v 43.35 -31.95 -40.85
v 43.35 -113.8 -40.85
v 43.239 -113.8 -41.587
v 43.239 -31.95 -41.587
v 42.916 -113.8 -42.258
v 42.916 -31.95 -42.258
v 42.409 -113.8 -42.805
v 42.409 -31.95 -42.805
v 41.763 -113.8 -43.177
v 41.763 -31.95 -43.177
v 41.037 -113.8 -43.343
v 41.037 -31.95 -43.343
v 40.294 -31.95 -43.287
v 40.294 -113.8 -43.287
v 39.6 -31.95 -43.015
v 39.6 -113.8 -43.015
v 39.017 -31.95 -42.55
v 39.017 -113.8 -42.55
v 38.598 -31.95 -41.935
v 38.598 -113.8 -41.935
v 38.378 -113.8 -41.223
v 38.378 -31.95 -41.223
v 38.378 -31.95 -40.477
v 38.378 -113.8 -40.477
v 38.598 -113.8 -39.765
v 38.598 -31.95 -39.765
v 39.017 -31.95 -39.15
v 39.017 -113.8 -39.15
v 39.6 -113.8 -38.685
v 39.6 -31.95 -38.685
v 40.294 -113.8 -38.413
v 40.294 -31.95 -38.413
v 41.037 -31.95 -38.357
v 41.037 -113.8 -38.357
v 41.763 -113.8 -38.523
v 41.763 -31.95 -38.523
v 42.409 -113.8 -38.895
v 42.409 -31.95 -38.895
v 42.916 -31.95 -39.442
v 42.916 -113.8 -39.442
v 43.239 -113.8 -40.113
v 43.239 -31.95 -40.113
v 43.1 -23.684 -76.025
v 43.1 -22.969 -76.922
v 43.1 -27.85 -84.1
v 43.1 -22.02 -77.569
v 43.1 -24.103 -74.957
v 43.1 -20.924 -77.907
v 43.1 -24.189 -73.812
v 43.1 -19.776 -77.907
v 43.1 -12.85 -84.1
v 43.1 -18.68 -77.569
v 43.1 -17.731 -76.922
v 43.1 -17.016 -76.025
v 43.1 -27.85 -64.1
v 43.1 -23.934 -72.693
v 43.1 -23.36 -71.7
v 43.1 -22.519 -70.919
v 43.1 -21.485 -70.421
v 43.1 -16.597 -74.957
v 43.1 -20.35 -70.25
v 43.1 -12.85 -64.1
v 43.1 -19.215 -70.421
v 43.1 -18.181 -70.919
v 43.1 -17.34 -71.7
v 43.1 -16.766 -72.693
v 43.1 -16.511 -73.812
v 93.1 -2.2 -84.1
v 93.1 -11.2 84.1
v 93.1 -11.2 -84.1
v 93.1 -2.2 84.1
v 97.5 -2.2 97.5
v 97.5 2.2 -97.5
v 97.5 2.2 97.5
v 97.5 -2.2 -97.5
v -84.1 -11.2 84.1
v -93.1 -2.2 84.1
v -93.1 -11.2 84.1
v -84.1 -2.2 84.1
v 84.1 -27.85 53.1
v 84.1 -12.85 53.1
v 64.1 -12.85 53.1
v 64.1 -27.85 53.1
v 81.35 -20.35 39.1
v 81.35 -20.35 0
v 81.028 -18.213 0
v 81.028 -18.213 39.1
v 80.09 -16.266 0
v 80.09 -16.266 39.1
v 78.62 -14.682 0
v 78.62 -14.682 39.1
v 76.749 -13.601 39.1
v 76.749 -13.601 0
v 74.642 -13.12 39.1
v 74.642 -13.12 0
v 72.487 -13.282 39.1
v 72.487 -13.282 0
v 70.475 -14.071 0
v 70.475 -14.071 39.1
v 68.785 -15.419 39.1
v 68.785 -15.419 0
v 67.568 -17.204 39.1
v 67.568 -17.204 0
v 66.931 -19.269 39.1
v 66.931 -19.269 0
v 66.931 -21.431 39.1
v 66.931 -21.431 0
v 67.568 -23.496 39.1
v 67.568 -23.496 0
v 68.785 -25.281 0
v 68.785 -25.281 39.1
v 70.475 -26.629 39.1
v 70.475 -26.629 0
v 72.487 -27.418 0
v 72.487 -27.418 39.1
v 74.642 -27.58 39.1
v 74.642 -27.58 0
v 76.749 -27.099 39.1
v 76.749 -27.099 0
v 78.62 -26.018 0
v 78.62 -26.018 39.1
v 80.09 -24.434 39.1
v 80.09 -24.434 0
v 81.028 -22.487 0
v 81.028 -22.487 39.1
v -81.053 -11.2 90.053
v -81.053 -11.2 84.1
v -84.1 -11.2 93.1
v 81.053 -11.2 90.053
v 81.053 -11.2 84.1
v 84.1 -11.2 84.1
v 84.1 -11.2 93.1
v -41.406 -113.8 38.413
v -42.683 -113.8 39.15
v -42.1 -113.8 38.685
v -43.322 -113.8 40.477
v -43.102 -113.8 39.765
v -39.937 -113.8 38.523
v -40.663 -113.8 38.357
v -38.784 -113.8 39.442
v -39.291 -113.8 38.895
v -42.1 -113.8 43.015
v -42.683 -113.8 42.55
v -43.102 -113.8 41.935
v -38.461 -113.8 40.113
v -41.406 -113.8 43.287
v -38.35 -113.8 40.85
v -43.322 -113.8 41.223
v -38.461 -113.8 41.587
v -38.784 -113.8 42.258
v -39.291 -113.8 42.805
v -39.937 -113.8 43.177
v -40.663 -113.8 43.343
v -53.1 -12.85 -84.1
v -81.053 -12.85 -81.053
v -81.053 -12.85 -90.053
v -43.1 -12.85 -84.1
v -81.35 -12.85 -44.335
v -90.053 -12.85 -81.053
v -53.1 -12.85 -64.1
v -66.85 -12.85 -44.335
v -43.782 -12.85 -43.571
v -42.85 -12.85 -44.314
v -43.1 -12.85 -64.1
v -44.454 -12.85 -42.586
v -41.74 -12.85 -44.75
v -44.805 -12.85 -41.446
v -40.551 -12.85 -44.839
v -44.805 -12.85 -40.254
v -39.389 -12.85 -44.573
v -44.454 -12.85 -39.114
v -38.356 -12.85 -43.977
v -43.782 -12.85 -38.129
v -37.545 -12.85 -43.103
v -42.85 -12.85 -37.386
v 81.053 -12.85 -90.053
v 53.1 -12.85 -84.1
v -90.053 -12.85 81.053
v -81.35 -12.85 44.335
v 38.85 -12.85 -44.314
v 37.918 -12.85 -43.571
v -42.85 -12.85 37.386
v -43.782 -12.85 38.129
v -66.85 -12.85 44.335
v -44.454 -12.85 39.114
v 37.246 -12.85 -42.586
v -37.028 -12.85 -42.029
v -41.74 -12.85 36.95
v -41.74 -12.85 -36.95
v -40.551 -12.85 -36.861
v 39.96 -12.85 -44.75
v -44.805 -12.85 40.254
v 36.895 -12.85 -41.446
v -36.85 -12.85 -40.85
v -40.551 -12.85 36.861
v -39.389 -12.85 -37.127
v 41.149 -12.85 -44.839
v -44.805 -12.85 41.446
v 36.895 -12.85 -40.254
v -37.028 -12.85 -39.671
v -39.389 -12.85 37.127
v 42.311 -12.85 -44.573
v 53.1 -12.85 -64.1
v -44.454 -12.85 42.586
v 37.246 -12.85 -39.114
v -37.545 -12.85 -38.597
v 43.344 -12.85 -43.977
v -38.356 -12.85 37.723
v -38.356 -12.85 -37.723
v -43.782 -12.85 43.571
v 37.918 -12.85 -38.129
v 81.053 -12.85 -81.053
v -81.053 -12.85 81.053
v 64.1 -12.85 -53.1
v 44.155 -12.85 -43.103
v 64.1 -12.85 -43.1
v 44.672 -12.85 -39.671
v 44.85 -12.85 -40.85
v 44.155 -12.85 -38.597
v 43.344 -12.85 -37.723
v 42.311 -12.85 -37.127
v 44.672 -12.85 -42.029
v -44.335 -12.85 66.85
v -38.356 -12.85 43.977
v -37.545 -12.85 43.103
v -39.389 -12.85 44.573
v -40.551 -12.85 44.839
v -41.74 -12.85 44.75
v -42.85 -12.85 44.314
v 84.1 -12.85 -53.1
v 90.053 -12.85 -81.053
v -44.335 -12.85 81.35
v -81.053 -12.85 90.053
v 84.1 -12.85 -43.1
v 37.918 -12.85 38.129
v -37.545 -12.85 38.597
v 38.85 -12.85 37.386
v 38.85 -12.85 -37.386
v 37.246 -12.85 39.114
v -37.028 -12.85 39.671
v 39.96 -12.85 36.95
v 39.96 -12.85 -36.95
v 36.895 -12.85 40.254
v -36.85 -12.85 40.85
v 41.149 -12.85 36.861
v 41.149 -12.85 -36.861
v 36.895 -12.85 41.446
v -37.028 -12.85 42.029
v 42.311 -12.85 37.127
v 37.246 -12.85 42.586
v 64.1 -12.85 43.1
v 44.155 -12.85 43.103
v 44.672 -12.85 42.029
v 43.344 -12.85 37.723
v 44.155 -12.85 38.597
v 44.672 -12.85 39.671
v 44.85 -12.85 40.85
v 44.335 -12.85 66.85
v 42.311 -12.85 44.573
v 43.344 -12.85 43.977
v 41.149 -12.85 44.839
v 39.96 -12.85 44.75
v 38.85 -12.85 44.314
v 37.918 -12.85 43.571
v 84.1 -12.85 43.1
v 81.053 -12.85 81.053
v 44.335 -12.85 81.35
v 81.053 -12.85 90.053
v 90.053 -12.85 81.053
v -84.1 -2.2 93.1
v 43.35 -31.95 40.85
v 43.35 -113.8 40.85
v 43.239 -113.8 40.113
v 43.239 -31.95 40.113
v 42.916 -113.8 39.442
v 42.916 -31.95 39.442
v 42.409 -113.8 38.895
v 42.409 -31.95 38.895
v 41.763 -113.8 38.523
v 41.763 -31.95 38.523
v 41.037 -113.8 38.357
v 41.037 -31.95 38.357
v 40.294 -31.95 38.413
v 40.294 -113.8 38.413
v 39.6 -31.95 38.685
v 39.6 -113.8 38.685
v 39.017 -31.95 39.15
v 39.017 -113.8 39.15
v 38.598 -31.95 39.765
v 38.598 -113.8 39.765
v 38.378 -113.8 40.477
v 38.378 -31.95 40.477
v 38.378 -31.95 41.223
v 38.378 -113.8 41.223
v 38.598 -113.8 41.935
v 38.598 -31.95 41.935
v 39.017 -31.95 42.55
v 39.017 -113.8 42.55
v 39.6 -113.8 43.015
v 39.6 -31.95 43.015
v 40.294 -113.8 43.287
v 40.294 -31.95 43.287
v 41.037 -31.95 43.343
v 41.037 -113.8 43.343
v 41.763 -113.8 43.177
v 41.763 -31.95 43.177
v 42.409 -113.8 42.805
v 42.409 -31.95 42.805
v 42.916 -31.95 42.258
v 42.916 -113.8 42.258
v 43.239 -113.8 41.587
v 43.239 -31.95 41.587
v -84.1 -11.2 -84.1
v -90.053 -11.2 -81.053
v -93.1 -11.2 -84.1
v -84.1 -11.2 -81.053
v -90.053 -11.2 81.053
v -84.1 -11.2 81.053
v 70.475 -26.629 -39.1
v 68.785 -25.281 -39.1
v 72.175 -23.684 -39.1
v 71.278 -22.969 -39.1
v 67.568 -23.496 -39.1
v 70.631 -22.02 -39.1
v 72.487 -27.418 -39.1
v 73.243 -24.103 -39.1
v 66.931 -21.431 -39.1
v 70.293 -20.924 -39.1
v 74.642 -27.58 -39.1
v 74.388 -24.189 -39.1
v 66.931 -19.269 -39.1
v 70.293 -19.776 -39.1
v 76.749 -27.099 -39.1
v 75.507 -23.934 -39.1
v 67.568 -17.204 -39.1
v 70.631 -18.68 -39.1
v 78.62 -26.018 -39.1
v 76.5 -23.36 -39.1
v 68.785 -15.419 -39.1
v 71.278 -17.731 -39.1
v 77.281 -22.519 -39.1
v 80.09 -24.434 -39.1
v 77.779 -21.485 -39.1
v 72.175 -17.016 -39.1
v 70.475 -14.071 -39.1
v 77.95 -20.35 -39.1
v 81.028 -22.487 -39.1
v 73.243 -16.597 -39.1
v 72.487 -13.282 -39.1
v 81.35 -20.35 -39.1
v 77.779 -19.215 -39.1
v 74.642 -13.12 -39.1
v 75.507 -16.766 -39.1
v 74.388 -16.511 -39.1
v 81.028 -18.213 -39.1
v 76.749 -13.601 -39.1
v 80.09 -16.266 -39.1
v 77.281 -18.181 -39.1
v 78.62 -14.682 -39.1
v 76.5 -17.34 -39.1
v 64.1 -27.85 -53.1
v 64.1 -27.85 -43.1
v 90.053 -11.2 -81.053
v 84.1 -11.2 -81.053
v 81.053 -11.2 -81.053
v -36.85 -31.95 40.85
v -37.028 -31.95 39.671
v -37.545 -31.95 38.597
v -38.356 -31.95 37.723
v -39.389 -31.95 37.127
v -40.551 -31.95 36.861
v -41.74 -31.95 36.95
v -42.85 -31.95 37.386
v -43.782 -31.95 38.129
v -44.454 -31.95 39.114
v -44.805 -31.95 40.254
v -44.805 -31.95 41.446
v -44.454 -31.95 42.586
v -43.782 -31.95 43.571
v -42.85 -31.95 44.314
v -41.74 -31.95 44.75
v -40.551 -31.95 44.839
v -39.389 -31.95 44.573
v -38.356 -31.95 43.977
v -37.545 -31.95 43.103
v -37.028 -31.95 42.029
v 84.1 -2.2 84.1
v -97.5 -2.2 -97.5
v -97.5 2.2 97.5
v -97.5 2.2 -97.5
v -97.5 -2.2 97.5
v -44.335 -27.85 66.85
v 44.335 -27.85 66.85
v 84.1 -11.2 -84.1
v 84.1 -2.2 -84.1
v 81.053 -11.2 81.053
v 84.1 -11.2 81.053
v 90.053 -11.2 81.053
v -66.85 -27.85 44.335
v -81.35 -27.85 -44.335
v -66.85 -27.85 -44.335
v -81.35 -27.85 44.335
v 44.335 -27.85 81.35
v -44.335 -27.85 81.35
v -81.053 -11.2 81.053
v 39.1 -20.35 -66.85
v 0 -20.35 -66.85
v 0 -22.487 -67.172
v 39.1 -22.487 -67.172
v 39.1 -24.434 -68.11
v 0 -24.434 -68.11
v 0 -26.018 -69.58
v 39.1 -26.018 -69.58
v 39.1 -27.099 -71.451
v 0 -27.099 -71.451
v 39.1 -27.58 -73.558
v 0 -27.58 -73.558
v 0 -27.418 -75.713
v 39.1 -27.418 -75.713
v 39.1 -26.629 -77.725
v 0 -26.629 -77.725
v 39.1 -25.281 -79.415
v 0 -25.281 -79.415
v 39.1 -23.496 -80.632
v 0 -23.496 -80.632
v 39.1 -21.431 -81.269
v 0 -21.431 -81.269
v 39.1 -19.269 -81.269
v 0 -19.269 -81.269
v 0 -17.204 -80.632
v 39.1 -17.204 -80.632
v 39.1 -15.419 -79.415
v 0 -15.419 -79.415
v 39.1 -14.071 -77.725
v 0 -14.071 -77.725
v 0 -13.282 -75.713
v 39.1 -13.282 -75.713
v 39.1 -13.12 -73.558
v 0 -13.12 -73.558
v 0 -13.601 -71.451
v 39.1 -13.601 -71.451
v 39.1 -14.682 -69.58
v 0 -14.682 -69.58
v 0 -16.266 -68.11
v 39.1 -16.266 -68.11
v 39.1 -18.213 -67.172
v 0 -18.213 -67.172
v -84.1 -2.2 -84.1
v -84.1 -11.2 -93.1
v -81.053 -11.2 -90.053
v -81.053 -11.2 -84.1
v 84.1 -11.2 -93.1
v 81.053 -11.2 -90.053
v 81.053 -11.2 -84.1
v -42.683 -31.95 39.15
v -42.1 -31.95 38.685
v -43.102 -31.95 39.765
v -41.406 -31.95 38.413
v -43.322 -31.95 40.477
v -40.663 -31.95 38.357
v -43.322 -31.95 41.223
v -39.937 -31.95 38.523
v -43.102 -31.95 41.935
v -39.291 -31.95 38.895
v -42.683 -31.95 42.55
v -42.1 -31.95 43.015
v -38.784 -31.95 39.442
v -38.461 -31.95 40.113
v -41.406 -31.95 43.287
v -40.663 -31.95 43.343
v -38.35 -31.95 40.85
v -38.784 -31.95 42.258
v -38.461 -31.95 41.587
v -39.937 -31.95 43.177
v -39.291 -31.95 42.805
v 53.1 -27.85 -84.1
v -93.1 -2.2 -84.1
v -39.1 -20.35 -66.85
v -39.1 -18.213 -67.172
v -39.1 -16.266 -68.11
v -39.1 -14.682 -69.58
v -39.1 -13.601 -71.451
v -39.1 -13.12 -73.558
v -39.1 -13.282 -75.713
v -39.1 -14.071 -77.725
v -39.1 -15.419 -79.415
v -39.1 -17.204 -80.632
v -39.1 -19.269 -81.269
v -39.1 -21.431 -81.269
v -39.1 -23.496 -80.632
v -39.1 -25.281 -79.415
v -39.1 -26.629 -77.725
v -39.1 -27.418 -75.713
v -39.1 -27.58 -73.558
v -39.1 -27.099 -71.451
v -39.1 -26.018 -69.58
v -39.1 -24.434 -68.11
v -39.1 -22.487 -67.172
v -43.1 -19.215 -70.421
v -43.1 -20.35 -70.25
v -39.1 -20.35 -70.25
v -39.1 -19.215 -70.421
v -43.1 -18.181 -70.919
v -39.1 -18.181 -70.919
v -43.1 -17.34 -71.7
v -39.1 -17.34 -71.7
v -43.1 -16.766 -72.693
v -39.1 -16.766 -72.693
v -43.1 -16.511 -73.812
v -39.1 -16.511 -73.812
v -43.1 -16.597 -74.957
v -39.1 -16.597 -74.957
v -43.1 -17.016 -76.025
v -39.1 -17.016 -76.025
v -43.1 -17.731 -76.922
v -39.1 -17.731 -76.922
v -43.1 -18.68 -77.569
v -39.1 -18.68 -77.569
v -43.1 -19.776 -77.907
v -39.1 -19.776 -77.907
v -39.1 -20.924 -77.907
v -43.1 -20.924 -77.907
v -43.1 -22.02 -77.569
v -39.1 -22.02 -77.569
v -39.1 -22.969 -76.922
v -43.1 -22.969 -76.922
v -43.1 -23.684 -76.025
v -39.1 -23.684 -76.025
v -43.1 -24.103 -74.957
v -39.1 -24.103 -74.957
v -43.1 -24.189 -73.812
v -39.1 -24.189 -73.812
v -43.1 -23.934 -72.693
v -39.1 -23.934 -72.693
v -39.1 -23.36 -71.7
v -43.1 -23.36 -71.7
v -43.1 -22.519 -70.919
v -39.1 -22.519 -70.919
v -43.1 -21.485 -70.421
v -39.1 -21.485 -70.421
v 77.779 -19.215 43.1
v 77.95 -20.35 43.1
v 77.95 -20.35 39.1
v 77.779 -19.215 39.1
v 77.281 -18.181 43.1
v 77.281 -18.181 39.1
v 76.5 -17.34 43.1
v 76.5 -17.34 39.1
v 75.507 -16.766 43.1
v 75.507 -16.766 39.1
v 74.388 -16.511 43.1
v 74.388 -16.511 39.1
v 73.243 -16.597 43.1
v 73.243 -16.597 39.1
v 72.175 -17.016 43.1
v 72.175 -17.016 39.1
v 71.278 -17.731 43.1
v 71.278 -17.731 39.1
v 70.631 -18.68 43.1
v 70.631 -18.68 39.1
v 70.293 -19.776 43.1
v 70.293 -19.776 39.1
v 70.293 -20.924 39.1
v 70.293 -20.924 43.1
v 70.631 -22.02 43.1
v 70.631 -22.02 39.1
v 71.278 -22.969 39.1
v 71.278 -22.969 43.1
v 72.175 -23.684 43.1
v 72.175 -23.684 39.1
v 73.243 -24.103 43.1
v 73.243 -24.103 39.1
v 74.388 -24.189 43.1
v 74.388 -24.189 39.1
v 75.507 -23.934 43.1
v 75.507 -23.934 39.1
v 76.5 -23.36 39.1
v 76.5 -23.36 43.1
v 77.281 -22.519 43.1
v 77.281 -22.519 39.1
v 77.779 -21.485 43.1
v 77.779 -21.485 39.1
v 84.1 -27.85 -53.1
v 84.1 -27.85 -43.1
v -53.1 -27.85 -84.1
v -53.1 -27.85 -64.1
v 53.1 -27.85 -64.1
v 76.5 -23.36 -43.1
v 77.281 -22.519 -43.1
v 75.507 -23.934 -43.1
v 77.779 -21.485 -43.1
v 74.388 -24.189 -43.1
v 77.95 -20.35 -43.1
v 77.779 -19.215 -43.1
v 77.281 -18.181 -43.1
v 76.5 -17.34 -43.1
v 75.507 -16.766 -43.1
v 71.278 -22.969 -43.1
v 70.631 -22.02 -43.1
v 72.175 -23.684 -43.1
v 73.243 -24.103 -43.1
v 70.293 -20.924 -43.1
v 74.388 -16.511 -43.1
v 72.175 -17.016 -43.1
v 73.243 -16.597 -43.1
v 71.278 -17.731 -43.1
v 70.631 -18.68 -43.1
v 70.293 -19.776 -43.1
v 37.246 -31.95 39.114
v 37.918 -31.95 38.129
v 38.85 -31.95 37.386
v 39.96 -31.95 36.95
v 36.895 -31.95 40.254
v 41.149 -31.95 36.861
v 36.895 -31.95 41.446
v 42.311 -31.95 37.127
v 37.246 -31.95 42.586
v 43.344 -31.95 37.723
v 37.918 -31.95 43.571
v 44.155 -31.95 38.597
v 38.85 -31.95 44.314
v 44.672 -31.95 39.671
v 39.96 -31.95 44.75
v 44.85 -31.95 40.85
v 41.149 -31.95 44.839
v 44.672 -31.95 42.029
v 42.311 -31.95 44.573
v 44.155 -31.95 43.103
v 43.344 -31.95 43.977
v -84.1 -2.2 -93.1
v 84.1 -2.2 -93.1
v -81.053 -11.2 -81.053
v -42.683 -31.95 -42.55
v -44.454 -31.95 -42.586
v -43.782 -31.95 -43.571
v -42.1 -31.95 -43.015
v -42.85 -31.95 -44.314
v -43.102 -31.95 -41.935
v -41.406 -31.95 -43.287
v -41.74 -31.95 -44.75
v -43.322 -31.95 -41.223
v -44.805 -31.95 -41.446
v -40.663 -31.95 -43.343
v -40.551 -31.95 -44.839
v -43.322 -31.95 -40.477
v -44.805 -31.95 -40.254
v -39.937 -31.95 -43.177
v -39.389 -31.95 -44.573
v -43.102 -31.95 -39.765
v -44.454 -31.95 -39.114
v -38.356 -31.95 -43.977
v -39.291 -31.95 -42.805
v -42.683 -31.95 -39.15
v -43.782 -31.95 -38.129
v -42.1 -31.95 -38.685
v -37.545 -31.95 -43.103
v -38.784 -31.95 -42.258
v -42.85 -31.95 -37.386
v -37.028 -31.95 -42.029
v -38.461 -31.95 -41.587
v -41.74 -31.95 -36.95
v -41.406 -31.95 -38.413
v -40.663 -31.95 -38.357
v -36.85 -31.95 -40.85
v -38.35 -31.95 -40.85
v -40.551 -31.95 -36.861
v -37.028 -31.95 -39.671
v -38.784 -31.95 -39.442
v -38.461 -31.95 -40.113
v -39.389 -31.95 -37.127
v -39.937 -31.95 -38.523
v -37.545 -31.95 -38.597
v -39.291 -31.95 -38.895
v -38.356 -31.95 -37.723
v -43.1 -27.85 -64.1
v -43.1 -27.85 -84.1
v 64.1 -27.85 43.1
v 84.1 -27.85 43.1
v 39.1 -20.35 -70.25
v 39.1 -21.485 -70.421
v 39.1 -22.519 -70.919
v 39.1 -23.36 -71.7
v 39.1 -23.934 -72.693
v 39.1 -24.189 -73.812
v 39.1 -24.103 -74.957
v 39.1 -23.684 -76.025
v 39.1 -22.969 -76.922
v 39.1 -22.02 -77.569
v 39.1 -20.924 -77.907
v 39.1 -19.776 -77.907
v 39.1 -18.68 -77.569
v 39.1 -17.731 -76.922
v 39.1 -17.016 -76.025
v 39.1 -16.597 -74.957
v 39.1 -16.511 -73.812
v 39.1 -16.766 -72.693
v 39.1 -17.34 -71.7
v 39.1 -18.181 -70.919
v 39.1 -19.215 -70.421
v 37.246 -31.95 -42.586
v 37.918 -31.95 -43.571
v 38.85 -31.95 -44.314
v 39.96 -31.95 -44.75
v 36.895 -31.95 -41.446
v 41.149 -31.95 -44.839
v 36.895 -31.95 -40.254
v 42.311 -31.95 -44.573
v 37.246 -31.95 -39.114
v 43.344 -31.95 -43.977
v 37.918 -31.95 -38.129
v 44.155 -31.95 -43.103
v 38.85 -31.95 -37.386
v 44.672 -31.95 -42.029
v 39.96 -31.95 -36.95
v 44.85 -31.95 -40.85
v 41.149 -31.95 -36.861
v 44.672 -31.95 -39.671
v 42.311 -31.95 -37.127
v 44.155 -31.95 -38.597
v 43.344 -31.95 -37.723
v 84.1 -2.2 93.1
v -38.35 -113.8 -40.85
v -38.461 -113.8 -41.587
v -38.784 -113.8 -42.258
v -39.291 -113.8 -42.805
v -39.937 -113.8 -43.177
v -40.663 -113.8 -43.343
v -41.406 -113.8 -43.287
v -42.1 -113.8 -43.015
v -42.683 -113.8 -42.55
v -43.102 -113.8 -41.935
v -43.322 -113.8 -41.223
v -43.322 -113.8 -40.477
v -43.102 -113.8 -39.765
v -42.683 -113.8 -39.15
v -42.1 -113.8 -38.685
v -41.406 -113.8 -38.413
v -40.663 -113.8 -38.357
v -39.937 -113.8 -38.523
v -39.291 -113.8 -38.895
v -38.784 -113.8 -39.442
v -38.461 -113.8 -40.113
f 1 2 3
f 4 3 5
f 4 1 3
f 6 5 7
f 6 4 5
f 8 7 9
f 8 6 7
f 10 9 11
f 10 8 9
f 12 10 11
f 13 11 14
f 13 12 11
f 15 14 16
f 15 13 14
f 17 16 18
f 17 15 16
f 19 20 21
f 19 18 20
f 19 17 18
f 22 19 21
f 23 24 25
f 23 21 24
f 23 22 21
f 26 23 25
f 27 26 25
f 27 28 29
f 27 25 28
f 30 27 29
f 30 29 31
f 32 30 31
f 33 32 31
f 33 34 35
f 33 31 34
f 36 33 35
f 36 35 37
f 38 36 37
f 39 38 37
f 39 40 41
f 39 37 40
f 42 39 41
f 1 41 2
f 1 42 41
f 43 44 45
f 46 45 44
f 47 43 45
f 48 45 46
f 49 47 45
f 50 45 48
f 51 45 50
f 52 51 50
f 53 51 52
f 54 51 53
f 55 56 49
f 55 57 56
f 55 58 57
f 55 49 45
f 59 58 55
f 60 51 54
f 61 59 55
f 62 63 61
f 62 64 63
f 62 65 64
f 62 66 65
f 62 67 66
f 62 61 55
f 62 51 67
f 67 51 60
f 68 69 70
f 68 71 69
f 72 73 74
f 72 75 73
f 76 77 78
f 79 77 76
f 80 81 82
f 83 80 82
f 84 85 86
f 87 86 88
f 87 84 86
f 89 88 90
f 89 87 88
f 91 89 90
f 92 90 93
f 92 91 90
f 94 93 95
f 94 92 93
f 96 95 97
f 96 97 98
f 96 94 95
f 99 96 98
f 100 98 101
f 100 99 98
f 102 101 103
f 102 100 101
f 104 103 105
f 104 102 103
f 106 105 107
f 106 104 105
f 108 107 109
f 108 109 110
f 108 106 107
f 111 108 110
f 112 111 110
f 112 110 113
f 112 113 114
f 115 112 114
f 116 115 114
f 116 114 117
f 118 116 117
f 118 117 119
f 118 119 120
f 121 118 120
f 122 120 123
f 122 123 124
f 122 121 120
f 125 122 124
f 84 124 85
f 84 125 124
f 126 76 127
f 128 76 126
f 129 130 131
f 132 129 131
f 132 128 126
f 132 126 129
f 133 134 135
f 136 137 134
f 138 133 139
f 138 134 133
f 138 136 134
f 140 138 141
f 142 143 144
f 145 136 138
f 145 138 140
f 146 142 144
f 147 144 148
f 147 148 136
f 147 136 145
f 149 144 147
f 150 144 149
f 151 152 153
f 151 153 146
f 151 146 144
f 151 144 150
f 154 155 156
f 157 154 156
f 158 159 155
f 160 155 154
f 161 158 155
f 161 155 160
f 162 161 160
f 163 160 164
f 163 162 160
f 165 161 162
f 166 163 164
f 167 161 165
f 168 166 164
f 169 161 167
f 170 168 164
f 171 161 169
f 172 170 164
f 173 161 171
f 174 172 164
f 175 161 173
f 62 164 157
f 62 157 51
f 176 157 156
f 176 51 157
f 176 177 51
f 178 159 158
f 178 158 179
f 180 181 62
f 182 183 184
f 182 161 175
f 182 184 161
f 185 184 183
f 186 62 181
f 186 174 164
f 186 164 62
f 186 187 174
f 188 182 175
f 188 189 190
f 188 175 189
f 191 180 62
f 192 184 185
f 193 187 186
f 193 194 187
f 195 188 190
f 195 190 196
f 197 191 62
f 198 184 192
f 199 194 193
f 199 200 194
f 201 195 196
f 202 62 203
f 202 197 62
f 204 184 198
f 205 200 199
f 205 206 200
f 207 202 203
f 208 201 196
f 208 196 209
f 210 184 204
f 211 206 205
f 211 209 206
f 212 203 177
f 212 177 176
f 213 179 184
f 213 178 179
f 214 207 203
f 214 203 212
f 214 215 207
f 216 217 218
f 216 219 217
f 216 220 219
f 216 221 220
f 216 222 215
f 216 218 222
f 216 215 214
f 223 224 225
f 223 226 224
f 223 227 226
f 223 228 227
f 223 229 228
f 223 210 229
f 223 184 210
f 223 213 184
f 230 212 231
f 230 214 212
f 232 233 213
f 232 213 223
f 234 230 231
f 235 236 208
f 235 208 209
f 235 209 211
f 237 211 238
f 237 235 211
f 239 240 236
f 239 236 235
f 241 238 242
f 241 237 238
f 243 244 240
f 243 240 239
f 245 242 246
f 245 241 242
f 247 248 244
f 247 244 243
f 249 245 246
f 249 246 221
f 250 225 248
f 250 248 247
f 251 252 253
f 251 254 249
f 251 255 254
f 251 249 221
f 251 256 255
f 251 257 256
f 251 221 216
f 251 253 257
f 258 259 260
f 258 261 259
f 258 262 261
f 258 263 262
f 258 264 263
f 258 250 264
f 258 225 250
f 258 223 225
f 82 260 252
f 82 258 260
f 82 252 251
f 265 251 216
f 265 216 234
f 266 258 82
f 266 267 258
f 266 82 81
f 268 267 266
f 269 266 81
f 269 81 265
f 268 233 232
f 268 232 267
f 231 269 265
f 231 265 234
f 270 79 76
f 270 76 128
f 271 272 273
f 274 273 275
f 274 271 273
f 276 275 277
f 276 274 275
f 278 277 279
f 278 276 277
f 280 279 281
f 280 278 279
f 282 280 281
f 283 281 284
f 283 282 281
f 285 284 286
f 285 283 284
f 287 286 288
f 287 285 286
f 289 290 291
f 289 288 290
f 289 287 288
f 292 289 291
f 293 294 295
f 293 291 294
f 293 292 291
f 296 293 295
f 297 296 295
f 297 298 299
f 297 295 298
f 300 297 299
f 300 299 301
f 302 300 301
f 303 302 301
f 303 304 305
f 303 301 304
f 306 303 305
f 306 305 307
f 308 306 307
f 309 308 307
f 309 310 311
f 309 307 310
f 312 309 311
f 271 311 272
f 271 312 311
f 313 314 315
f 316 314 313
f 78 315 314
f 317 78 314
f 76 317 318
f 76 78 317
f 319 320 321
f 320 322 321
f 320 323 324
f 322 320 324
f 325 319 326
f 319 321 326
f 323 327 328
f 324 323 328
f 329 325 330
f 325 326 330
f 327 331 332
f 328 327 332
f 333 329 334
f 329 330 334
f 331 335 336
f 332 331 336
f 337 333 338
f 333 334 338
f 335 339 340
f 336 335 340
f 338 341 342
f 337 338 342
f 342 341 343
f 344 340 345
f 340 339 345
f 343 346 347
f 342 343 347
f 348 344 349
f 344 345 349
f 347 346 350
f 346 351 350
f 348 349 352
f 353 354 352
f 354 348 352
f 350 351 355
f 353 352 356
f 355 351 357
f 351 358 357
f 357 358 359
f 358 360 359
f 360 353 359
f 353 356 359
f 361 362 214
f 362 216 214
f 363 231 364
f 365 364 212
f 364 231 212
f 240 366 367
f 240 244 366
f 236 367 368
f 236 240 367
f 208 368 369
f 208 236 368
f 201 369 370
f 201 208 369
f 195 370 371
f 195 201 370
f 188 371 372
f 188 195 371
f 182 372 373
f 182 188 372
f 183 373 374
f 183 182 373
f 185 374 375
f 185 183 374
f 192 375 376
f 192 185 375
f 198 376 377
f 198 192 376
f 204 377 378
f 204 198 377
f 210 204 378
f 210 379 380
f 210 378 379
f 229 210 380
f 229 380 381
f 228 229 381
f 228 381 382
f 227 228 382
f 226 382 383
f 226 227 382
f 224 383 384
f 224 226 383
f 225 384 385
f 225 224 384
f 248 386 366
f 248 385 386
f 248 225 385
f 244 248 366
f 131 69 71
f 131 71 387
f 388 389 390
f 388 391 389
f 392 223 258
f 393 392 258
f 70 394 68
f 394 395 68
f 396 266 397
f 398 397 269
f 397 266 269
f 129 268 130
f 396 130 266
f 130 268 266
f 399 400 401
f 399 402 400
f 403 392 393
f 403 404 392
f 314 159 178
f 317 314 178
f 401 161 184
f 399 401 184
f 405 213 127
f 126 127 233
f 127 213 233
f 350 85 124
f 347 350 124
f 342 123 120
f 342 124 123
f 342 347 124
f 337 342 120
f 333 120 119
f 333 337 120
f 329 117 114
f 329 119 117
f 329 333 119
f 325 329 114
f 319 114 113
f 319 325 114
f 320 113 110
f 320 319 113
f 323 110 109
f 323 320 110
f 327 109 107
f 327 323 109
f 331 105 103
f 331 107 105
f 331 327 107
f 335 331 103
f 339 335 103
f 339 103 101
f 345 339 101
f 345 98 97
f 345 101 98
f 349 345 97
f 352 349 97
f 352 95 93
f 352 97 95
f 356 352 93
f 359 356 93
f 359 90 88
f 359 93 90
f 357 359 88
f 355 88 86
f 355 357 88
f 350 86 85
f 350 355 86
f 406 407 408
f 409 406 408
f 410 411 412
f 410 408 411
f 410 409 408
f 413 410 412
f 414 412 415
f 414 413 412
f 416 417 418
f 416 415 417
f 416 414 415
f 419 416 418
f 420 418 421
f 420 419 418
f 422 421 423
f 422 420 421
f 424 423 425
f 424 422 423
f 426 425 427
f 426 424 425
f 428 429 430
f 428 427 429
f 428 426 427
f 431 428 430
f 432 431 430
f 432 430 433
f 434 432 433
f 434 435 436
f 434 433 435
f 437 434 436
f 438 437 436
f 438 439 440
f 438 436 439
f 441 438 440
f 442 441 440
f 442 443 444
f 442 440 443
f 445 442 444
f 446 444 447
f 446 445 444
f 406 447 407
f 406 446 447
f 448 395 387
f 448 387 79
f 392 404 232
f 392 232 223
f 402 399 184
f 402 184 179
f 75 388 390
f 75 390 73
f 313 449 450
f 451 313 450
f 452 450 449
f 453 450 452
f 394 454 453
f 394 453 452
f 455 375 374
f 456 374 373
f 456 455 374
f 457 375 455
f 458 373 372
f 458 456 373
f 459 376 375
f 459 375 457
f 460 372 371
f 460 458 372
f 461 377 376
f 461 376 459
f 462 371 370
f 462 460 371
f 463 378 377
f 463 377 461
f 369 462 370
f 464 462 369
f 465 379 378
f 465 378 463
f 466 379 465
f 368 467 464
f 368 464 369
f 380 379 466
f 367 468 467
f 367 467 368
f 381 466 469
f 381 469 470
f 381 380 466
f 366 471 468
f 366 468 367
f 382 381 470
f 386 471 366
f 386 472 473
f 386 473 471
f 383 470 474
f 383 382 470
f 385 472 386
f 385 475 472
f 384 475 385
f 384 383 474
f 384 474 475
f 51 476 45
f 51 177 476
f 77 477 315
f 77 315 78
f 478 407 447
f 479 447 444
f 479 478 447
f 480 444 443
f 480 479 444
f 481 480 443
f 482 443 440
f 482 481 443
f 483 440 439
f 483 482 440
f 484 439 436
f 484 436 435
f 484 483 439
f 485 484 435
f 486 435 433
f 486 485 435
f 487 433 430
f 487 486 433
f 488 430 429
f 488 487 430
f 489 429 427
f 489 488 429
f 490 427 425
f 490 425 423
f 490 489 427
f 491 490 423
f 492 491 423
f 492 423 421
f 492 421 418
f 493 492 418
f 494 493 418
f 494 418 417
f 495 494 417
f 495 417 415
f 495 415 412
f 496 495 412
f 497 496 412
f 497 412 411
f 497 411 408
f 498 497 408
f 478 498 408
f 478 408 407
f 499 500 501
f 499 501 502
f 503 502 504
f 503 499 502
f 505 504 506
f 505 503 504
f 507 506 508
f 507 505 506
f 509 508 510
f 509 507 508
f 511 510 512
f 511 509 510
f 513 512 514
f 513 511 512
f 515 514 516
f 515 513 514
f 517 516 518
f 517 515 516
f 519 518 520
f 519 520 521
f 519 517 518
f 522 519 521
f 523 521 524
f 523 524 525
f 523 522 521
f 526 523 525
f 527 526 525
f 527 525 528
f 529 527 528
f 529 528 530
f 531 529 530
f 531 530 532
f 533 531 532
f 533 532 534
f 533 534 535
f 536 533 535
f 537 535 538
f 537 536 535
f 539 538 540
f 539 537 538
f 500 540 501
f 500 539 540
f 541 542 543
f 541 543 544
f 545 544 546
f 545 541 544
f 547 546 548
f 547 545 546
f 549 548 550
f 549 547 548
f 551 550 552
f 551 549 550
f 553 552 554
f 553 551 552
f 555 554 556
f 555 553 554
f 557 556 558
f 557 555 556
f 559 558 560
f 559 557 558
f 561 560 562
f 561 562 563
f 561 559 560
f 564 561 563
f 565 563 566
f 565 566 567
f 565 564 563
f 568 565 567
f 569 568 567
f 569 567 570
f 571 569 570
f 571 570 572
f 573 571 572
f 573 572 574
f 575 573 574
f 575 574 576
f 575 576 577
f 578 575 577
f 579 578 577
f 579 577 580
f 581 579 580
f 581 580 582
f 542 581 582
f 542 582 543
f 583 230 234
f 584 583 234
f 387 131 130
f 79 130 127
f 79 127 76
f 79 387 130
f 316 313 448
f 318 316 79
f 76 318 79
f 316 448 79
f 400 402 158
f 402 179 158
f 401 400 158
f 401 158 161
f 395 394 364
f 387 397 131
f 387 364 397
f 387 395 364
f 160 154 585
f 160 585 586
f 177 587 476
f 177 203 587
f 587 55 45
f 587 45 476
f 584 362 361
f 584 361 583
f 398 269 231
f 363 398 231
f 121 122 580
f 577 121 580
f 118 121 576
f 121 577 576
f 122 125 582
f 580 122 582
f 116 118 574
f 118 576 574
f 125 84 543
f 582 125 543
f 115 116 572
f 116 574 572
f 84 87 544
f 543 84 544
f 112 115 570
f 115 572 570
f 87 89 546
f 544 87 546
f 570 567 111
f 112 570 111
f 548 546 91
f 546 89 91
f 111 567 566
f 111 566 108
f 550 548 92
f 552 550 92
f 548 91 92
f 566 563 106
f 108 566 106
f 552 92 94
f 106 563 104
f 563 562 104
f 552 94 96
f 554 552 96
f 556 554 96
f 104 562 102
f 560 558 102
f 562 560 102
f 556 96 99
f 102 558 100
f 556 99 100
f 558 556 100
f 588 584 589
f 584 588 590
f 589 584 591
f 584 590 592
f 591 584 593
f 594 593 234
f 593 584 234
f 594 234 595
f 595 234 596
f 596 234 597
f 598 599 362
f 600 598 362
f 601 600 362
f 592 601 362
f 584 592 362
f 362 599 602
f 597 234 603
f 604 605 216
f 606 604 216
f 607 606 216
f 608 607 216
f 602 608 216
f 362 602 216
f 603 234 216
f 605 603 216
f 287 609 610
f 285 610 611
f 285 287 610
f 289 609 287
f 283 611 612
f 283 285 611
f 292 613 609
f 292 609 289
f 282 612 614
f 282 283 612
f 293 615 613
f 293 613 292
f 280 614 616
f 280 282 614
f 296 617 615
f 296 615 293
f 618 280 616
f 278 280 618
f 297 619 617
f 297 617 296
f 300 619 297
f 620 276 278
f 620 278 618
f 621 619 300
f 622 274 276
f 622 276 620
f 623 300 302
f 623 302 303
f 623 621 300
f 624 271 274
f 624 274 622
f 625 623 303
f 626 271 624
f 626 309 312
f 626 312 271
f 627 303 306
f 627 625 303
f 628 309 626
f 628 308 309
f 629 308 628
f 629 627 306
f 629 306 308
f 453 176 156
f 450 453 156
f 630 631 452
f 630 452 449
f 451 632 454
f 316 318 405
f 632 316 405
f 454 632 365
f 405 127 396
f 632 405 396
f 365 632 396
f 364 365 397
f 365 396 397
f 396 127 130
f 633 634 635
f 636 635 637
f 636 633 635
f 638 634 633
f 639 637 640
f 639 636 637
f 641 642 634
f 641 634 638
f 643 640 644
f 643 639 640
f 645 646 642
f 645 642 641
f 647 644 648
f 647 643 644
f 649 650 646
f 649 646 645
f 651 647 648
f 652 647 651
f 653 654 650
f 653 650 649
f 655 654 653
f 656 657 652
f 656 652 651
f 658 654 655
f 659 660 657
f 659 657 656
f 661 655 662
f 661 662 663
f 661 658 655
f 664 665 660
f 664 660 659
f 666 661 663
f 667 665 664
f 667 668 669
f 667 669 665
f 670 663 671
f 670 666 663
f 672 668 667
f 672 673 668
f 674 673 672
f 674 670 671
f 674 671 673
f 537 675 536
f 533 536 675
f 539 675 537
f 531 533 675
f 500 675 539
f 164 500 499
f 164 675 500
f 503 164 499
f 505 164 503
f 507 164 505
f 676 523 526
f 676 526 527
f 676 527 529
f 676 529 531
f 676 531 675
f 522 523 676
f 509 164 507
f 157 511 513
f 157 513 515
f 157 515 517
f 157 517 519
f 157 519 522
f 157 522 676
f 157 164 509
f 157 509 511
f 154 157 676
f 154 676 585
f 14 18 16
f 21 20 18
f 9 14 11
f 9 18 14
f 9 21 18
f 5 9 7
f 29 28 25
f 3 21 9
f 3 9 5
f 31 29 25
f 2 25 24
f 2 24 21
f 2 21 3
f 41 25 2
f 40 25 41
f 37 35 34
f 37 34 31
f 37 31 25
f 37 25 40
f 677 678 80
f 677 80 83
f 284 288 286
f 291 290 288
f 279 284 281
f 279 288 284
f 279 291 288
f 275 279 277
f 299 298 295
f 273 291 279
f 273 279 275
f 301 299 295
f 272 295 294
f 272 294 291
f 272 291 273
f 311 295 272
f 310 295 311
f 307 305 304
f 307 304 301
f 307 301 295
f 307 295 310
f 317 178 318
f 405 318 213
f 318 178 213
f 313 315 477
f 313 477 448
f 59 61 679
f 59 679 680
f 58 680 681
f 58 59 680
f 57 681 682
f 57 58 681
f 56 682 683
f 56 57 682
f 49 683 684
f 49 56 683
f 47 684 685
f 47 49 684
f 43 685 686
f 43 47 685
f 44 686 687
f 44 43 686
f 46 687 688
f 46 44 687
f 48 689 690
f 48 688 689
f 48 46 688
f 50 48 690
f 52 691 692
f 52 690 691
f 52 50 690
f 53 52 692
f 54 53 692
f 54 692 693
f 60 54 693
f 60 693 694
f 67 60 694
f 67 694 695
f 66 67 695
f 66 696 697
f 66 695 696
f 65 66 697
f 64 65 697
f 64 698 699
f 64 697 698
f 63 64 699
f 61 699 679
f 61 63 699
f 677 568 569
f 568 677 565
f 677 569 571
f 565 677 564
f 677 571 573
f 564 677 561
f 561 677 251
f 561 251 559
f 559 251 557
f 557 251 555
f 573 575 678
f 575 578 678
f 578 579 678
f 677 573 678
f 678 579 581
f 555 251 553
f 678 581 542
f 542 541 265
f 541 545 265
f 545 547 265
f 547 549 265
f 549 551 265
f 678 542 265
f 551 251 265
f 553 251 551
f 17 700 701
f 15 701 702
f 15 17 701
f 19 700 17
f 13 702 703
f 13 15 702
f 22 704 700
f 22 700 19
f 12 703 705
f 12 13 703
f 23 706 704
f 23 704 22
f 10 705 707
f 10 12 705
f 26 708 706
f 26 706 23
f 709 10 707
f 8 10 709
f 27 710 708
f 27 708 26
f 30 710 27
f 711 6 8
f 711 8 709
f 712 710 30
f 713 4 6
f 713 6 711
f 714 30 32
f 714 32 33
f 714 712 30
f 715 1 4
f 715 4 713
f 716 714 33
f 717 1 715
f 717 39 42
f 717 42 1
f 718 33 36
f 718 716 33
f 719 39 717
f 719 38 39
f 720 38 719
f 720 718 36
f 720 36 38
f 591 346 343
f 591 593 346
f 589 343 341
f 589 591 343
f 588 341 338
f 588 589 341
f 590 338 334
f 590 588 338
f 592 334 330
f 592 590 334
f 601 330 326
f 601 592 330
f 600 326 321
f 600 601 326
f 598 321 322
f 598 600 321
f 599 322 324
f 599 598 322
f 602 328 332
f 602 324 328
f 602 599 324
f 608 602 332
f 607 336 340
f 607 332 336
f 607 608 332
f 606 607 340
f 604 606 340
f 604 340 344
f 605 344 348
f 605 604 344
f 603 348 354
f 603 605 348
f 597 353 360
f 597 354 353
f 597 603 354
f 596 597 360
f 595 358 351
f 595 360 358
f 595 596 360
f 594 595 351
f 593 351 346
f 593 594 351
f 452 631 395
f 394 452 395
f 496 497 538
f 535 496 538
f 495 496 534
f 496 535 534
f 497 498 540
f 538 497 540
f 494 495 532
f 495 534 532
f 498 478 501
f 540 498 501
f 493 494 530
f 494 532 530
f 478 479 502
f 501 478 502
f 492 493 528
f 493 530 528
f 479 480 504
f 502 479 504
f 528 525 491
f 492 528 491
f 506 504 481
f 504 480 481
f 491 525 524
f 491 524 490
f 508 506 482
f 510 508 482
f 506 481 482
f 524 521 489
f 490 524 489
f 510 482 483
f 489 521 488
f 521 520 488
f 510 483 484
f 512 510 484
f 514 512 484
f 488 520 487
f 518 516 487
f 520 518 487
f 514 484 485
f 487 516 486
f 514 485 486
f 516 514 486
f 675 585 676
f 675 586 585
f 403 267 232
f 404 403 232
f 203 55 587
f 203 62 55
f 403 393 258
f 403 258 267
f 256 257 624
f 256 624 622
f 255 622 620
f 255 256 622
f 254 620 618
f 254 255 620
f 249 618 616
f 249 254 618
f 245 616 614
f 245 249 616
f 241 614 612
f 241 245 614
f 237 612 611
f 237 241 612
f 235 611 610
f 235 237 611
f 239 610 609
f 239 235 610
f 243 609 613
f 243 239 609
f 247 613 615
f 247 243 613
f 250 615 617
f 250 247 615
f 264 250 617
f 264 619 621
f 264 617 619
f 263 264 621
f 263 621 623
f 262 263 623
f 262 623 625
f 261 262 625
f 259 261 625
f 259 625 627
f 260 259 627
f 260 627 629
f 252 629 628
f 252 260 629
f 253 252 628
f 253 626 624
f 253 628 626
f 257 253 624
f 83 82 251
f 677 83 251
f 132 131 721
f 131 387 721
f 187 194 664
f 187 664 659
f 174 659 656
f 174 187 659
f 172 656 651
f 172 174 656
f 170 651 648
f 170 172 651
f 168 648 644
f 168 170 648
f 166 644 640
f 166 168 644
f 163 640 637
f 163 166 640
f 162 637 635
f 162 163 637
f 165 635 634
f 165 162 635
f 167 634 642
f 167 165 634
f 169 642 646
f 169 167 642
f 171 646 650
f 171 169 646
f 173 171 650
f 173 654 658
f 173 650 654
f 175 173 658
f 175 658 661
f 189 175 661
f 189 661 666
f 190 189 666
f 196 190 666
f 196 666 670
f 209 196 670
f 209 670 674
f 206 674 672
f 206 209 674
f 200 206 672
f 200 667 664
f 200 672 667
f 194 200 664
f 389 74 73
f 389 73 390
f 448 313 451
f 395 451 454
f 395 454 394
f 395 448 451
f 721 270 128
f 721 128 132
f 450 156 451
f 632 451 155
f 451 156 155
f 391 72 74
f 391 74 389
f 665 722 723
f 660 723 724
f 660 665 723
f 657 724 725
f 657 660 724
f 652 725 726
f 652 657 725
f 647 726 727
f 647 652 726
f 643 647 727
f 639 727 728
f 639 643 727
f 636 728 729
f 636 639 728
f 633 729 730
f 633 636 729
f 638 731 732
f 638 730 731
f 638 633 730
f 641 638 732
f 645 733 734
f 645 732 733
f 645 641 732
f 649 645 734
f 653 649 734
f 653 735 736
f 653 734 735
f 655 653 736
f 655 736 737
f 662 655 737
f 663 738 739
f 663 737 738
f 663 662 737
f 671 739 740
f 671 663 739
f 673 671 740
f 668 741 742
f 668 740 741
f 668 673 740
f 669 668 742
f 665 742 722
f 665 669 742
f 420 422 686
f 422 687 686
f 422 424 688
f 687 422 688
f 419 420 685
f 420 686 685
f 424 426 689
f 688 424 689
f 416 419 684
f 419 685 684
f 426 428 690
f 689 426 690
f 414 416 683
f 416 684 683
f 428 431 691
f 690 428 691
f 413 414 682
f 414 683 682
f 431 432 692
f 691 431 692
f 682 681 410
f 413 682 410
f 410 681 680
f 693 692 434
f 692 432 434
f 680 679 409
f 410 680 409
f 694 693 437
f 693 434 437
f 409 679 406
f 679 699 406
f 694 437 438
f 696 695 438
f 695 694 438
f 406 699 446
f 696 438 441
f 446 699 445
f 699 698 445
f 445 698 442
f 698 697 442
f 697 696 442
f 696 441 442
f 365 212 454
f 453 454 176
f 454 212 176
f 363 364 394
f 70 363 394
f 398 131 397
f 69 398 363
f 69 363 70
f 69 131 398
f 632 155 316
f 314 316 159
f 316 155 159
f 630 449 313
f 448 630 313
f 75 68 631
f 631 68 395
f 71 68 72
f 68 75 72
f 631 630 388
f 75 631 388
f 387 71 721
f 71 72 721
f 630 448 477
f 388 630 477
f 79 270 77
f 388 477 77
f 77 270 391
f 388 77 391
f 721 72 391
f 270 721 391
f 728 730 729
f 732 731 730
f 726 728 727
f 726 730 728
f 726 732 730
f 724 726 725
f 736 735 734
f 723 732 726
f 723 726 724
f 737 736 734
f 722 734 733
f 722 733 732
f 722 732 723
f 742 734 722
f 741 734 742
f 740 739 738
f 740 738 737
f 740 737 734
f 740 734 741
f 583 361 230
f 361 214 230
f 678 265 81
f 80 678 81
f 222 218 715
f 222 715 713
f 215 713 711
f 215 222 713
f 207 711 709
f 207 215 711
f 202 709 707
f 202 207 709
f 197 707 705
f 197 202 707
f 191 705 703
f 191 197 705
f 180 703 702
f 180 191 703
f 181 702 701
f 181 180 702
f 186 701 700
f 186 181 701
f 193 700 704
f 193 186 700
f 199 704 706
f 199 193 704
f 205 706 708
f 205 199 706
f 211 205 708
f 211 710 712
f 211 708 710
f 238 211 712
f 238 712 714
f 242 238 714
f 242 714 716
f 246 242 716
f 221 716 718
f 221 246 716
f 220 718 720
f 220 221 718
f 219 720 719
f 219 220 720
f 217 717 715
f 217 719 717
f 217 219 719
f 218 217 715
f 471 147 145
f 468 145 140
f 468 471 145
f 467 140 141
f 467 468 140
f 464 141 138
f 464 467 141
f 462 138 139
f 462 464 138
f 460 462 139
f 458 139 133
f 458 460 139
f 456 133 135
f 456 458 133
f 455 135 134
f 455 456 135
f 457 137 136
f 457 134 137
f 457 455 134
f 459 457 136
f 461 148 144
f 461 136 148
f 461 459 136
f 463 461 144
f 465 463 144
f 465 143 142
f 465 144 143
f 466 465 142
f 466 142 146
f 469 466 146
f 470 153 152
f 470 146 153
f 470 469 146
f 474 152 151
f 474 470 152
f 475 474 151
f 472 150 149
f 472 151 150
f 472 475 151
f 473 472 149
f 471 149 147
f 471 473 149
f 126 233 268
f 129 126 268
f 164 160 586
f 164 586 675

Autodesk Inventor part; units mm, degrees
ref_plane "YZ Plane" through (0, 0, 0) normal (1, 0, 0) x (0, 1, 0)
ref_plane "XZ Plane" through (0, 0, 0) normal (0, 1, 0) x (-1, 0, 0)
ref_plane "XY Plane" through (0, 0, 0) normal (0, 0, 1) x (1, 0, 0)
sketch "Boceto1" plane through (0, 0, 0) normal (0, 1, 0) x (-1, 0, 0)
  line L0 (-97.5, 97.5) -> (97.5, 97.5)
  line L1 (97.5, 97.5) -> (97.5, -97.5)
  line L2 (97.5, -97.5) -> (-97.5, -97.5)
  line L3 (-97.5, -97.5) -> (-97.5, 97.5)
  line L4 (-97.5, 97.5) -> (97.5, -97.5) construction
  line L5 (97.5, 97.5) -> (-97.5, -97.5) construction
  point P0 (0, 0)
  dimension "d0" = 195
  dimension "d1" = 195
extrude "Extrusión1" add sketch "Boceto1" along normal mid plane 4.4
sketch "Boceto4" plane through (0, -2.2, 0) normal (0, -1, 0) x (1, 0, 0)
  line L0 (97.5, -97.5) -> (97.5, 97.5) construction
  line L1 (-97.5, 97.5) -> (-97.5, -97.5) construction
  line L2 (84.1, -93.1) -> (-84.1, -93.1)
  line L3 (-84.1, -93.1) -> (-84.1, -84.1)
  line L4 (-84.1, -84.1) -> (84.1, -84.1)
  line L5 (84.1, -84.1) -> (84.1, -93.1)
  line L6 (-97.5, -97.5) -> (97.5, -97.5) construction
  line L7 (93.1, -84.1) -> (84.1, -84.1)
  line L8 (84.1, -84.1) -> (84.1, 84.1)
  line L9 (84.1, 84.1) -> (93.1, 84.1)
  line L10 (93.1, 84.1) -> (93.1, -84.1)
  line L11 (0, -126.8945) -> (0, 107.949)
  line L12 (-84.1, -84.1) -> (-84.1, 84.1)
  line L13 (-84.1, 84.1) -> (-93.1, 84.1)
  line L14 (-93.1, 84.1) -> (-93.1, -84.1)
  line L15 (-93.1, -84.1) -> (-84.1, -84.1)
  line L16 (84.1, 84.1) -> (-84.1, 84.1)
  line L17 (84.1, 93.1) -> (-84.1, 93.1)
  line L18 (84.1, 84.1) -> (84.1, 93.1)
  line L19 (-84.1, 84.1) -> (-84.1, 93.1)
  point P0 (0, 0)
  point P1 (-84.1, -88.6)
  point P2 (88.6, -84.1)
  point P3 (84.1, -84.1)
  point P4 (84.1, -84.1)
  point P5 (84.1, -84.1)
  point P6 (84.1, -84.1)
  point P7 (-84.1, 84.1)
  point P8 (-84.1, 84.1)
  point P9 (-84.1, 84.1)
  point P10 (-84.1, 84.1)
  dimension "d20" = 4.4
  dimension "d21" = 9
  dimension "d22" = 13.4
  dimension "d23" = 13.4
  dimension "d24" = 4.4
  dimension "d25" = 9
  dimension "d26" = 13.4
  dimension "d30" = 9
extrude "Extrusión6" add sketch "Boceto4" along normal blind 9 contours L2 L11 L4 L5 | L2 L3 L4 L11 | L8 L9 L10 L7 | L16 L11 L17 L18 | L15 L14 L13 L12 | L16 L19 L17 L11
sketch "Boceto5" plane through (0, -11.2, 0) normal (0, -1, 0) x (1, 0, 0)
  line L0 (-84.1, -93.1) -> (84.1, -93.1) construction
  line L1 (93.1, -84.1) -> (93.1, 84.1) construction
  line L2 (-93.1, 84.1) -> (-93.1, -84.1) construction
  line L3 (84.1, 93.1) -> (-84.1, 93.1) construction
  line L4 (84.1, -93.1) -> (-84.1, -93.1)
  line L5 (-93.1, -84.1) -> (-93.1, 84.1)
  line L6 (-84.1, 93.1) -> (84.1, 93.1)
  line L7 (93.1, 84.1) -> (93.1, -84.1)
  line L8 (84.1, -93.1) -> (84.1, -84.1) projected
  line L9 (84.1, -84.1) -> (-84.1, -84.1) construction
  line L10 (84.1, -93.1) -> (84.1, -84.1)
  line L11 (84.1, -84.1) -> (93.1, -84.1)
  line L12 (93.1, 84.1) -> (84.1, 84.1)
  line L13 (84.1, 84.1) -> (84.1, 93.1)
  line L14 (-93.1, 84.1) -> (-84.1, 84.1)
  line L15 (-84.1, 84.1) -> (-84.1, 93.1)
  line L16 (-93.1, -84.1) -> (-84.1, -84.1) projected
  line L17 (-84.1, -93.1) -> (-84.1, -84.1)
  line L18 (-84.1, -84.1) -> (-93.1, -84.1)
  point P0 (0, 0)
extrude "Extrusión7" add sketch "Boceto5" along normal blind 1.65
sketch "Boceto6" plane through (0, -12.85, 0) normal (0, -1, 0) x (1, 0, 0)
  line L0 (-84.1, -84.1) -> (84.1, -84.1) construction
  line L1 (53.1, -84.1) -> (43.1, -84.1)
  line L2 (43.1, -84.1) -> (43.1, -64.1)
  line L3 (43.1, -64.1) -> (53.1, -64.1)
  line L4 (53.1, -64.1) -> (53.1, -84.1)
  line L5 (93.1, -84.1) -> (93.1, 84.1) projected
  line L6 (84.1, -84.1) -> (84.1, 84.1) projected
  line L7 (64.1, -53.1) -> (84.1, -53.1)
  line L8 (84.1, -53.1) -> (84.1, -43.1)
  line L9 (84.1, -43.1) -> (64.1, -43.1)
  line L10 (64.1, -43.1) -> (64.1, -53.1)
  line L11 (-84.1, -93.1) -> (84.1, -93.1) projected
  point P0 (0, 0)
  dimension "d35" = 40
  dimension "d36" = 10
  dimension "d37" = 20
  dimension "d38" = 40
  dimension "d39" = 10
  dimension "d40" = 20
extrude "Extrusión8" add sketch "Boceto6" along normal blind 15
sketch "Boceto7" plane through (43.1, -12.85, -84.1) normal (-1, 0, 0) x (0, 0, 1)
  line L0 (0, 0) -> (20, 0) projected
  line L1 (0, 0) -> (0, -15) construction
  line L2 (20, -15) -> (0, -15) construction
  line L3 (20, 0) -> (20, -15) construction
  line L4 (0, 0) -> (20, 0) projected
  circle A0 centre (10, -7.5) radius 3.85
  point P0 (84.1, 12.85)
  dimension "d43" = 7.7
extrude "Extrusión9" add sketch "Boceto7" along normal blind 4
sketch "Boceto8" plane through (39.1, -20.35, -74.1) normal (-1, 0, 0) x (0, 0, 1)
  circle A0 centre (0, 0) radius 3.85 projected
  circle A1 centre (0, 0) radius 7.25
  point P0 (74.1, 20.35)
  dimension "d46" = 14.5
extrude "Extrusión10" add sketch "Boceto8" along normal up to surface (39.1 mm away)
sketch "Boceto10" plane through (39.1, -20.35, -74.1) normal (-1, 0, 0) x (0, 0, 1)
  circle A0 centre (0, 0) radius 3.85 projected
  point P0 (74.1, 20.35)
extrude "Extrusión11" add sketch "Boceto10" along normal up to surface (39.1 mm away)
mirror "Simetría4" about plane through (0, 0, 0) normal (1, 0, 0) of "Extrusión9", "Extrusión10", "Extrusión11", "Extrusión8"
sketch "Boceto11" plane through (-84.1, -27.85, -53.1) normal (0, -1, 0) x (1, 0, 0)
  line L0 (20, 0) -> (0, 0) projected
  line L1 (20, 10) -> (20, 0) projected
  line L2 (0, 10) -> (20, 10) projected
  line L3 (0, 0) -> (0, 10) projected
  point P0 (84.1, 53.1)
extrude "Extrusión12" cut sketch "Boceto11" against normal up to surface (15 mm away)
sketch "Boceto12" plane through (64.1, -12.85, -43.1) normal (0, 0, 1) x (1, 0, 0)
  line L0 (0, 0) -> (20, 0) projected
  line L1 (0, 0) -> (0, -15) projected
  line L2 (20, -15) -> (0, -15) projected
  line L3 (20, 0) -> (20, -15) projected
  circle A0 centre (10, -7.5) radius 3.85
  point P0 (-64.1, 12.85)
  dimension "d53" = 7.7
extrude "Extrusión13" add sketch "Boceto12" along normal blind 4 contours A0
sketch "Boceto13" plane through (74.1, -20.35, -39.1) normal (0, 0, 1) x (1, 0, 0)
  circle A0 centre (0, 0) radius 3.85 projected
  circle A1 centre (0, 0) radius 7.25
  point P0 (-74.1, 20.35)
  dimension "d56" = 14.5
extrude "Extrusión14" add sketch "Boceto13" along normal up to surface (39.1 mm away)
sketch "Boceto14" plane through (74.1, -20.35, -39.1) normal (0, 0, 1) x (1, 0, 0)
  circle A0 centre (0, 0) radius 3.85 projected
  point P0 (-74.1, 20.35)
extrude "Extrusión15" add sketch "Boceto14" along normal up to surface (39.1 mm away)
mirror "Simetría5" about plane through (0, 0, 0) normal (0, 0, 1) of "Extrusión15", "Extrusión14", "Extrusión13", "Extrusión12", "Extrusión8"
sketch "Boceto15" plane through (43.1, -27.85, 64.1) normal (0, -1, 0) x (1, 0, 0)
  line L0 (10, 0) -> (0, 0) projected
  line L1 (10, 20) -> (10, 0) projected
  line L2 (0, 20) -> (10, 20) projected
  line L3 (0, 0) -> (0, 20) projected
  point P0 (-43.1, -64.1)
extrude "Extrusión16" cut sketch "Boceto15" against normal up to surface (15 mm away)
sketch "Boceto16" plane through (0, -12.85, 0) normal (0, -1, 0) x (1, 0, 0)
  line L0 (81.35, 39.1) -> (66.85, 39.1) construction
  line L1 (81.35, -39.1) -> (66.85, -39.1) construction
  line L2 (81.35, -39.1) -> (81.35, 39.1) construction
  line L3 (66.85, -39.1) -> (66.85, 39.1) construction
  line L4 (81.35, -39.1) -> (66.85, -39.1) construction
  line L5 (81.35, 39.1) -> (66.85, 39.1) construction
  line L6 (-39.1, -66.85) -> (-39.1, -81.35) projected
  line L7 (39.1, -66.85) -> (39.1, -81.35) projected
  line L8 (-81.35, -44.335) -> (-66.85, -44.335)
  line L9 (-66.85, -44.335) -> (-66.85, 44.335)
  line L10 (-66.85, 44.335) -> (-81.35, 44.335)
  line L11 (-81.35, 44.335) -> (-81.35, -44.335)
  line L12 (-93.1, 84.1) -> (-93.1, -84.1) construction
  line L13 (84.1, 93.1) -> (-84.1, 93.1) construction
  line L14 (-44.335, 81.35) -> (-44.335, 66.85)
  line L15 (-44.335, 66.85) -> (44.335, 66.85)
  line L16 (44.335, 66.85) -> (44.335, 81.35)
  line L17 (44.335, 81.35) -> (-44.335, 81.35)
  point P0 (0, 0)
  dimension "d84" = 11.75
  dimension "d85" = 14.5
  dimension "d86" = 88.67
  dimension "d87" = 48.765
  dimension "d88" = 14.5
  dimension "d89" = 88.67
  dimension "d90" = 48.765
  dimension "d91" = 11.75
sketch "Boceto17" plane through (0, -12.85, 0) normal (0, -1, 0) x (1, 0, 0)
  line L0 (50.85, 50.85) -> (-50.85, 50.85) construction
  line L1 (-50.85, 50.85) -> (-50.85, -50.85) construction
  line L2 (-50.85, -50.85) -> (50.85, -50.85) construction
  line L3 (50.85, -50.85) -> (50.85, 50.85) construction
  line L4 (50.85, 50.85) -> (-50.85, -50.85) construction
  line L5 (-50.85, 50.85) -> (50.85, -50.85) construction
  circle A0 centre (40.85, 40.85) radius 2.5
  circle A1 centre (-40.85, 40.85) radius 2.5
  line L6 (101.7, 0) -> (-109.1959, 0)
  circle A2 centre (40.85, -40.85) radius 2.5
  circle A3 centre (-40.85, -40.85) radius 2.5
  point P0 (0, 0)
  dimension "d67" = 101.7
  dimension "d68" = 101.7
  dimension "d69" = 5
  dimension "d70" = 10
  dimension "d71" = 10
  dimension "d72" = 10
  dimension "d73" = 10
  dimension "d94" = 5
  dimension "d95" = 5
extrude "Extrusión19" add sketch "Boceto17" along normal blind 100.95
sketch "Boceto18" plane through (0, -12.85, 0) normal (0, -1, 0) x (1, 0, 0)
  line L0 (84.1, 93.1) -> (-84.1, 93.1) projected
  line L1 (-84.1, 93.1) -> (-84.1, 84.1) projected
  line L2 (-84.1, 84.1) -> (-93.1, 84.1) projected
  line L3 (-93.1, 84.1) -> (-93.1, -84.1) projected
  line L4 (-93.1, -84.1) -> (-84.1, -84.1) projected
  line L5 (-84.1, -84.1) -> (-84.1, -93.1) projected
  line L6 (-84.1, -93.1) -> (84.1, -93.1) projected
  line L7 (84.1, -93.1) -> (84.1, -84.1) projected
  line L8 (93.1, -84.1) -> (93.1, 84.1) projected
  line L9 (84.1, -84.1) -> (93.1, -84.1) projected
  line L10 (93.1, 84.1) -> (84.1, 84.1) projected
  line L11 (84.1, 84.1) -> (84.1, 93.1) projected
  line L12 (-81.0533, 90.0533) -> (81.0533, 90.0533)
  line L13 (81.0533, 90.0533) -> (81.0533, 81.0533)
  line L14 (81.0533, 81.0533) -> (90.0533, 81.0533)
  line L15 (90.0533, 81.0533) -> (90.0533, -81.0533)
  line L16 (90.0533, -81.0533) -> (81.0533, -81.0533)
  line L17 (81.0533, -81.0533) -> (81.0533, -90.0533)
  line L18 (81.0533, -90.0533) -> (-81.0533, -90.0533)
  line L19 (-81.0533, -90.0533) -> (-81.0533, -81.0533)
  line L20 (-81.0533, -81.0533) -> (-90.0533, -81.0533)
  line L21 (-90.0533, -81.0533) -> (-90.0533, 81.0533)
  line L22 (-90.0533, 81.0533) -> (-81.0533, 81.0533)
  line L23 (-81.0533, 81.0533) -> (-81.0533, 90.0533)
  point P0 (0, 0)
extrude "Extrusión20" cut sketch "Boceto18" against normal blind 1.65
sketch "Boceto19" plane through (0, -12.85, 0) normal (0, -1, 0) x (1, 0, 0)
  circle A0 centre (-40.85, -40.85) radius 2.5 construction
  circle A1 centre (-40.85, -40.85) radius 2.5 construction
  circle A2 centre (-40.85, -40.85) radius 4
  line L0 (-66.85, -39.1) -> (-66.85, 39.1) projected
  circle A3 centre (-40.85, 40.85) radius 2.5 construction
  circle A4 centre (-40.85, 40.85) radius 4
  line L1 (0, -105.6023) -> (0, 128.9456)
  circle A5 centre (40.85, -40.85) radius 2.5 construction
  circle A6 centre (40.85, -40.85) radius 2.5 construction
  circle A7 centre (40.85, -40.85) radius 4
  circle A8 centre (40.85, 40.85) radius 2.5 construction
  circle A9 centre (40.85, 40.85) radius 4
  circle A10 centre (40.85, -40.85) radius 2.5 construction
  circle A11 centre (40.85, -40.85) radius 2.5 construction
  circle A12 centre (40.85, 40.85) radius 2.5 construction
  circle A13 centre (-40.85, 40.85) radius 2.5 construction
  point P0 (0, 0)
  dimension "d78" = 8
  dimension "d79" = 8
extrude "Extrusión21" add sketch "Boceto19" along normal blind 19.1
extrude "Extrusión22" add sketch "Boceto16" along normal blind 15
properties part number "Acrilico_Bottom"
